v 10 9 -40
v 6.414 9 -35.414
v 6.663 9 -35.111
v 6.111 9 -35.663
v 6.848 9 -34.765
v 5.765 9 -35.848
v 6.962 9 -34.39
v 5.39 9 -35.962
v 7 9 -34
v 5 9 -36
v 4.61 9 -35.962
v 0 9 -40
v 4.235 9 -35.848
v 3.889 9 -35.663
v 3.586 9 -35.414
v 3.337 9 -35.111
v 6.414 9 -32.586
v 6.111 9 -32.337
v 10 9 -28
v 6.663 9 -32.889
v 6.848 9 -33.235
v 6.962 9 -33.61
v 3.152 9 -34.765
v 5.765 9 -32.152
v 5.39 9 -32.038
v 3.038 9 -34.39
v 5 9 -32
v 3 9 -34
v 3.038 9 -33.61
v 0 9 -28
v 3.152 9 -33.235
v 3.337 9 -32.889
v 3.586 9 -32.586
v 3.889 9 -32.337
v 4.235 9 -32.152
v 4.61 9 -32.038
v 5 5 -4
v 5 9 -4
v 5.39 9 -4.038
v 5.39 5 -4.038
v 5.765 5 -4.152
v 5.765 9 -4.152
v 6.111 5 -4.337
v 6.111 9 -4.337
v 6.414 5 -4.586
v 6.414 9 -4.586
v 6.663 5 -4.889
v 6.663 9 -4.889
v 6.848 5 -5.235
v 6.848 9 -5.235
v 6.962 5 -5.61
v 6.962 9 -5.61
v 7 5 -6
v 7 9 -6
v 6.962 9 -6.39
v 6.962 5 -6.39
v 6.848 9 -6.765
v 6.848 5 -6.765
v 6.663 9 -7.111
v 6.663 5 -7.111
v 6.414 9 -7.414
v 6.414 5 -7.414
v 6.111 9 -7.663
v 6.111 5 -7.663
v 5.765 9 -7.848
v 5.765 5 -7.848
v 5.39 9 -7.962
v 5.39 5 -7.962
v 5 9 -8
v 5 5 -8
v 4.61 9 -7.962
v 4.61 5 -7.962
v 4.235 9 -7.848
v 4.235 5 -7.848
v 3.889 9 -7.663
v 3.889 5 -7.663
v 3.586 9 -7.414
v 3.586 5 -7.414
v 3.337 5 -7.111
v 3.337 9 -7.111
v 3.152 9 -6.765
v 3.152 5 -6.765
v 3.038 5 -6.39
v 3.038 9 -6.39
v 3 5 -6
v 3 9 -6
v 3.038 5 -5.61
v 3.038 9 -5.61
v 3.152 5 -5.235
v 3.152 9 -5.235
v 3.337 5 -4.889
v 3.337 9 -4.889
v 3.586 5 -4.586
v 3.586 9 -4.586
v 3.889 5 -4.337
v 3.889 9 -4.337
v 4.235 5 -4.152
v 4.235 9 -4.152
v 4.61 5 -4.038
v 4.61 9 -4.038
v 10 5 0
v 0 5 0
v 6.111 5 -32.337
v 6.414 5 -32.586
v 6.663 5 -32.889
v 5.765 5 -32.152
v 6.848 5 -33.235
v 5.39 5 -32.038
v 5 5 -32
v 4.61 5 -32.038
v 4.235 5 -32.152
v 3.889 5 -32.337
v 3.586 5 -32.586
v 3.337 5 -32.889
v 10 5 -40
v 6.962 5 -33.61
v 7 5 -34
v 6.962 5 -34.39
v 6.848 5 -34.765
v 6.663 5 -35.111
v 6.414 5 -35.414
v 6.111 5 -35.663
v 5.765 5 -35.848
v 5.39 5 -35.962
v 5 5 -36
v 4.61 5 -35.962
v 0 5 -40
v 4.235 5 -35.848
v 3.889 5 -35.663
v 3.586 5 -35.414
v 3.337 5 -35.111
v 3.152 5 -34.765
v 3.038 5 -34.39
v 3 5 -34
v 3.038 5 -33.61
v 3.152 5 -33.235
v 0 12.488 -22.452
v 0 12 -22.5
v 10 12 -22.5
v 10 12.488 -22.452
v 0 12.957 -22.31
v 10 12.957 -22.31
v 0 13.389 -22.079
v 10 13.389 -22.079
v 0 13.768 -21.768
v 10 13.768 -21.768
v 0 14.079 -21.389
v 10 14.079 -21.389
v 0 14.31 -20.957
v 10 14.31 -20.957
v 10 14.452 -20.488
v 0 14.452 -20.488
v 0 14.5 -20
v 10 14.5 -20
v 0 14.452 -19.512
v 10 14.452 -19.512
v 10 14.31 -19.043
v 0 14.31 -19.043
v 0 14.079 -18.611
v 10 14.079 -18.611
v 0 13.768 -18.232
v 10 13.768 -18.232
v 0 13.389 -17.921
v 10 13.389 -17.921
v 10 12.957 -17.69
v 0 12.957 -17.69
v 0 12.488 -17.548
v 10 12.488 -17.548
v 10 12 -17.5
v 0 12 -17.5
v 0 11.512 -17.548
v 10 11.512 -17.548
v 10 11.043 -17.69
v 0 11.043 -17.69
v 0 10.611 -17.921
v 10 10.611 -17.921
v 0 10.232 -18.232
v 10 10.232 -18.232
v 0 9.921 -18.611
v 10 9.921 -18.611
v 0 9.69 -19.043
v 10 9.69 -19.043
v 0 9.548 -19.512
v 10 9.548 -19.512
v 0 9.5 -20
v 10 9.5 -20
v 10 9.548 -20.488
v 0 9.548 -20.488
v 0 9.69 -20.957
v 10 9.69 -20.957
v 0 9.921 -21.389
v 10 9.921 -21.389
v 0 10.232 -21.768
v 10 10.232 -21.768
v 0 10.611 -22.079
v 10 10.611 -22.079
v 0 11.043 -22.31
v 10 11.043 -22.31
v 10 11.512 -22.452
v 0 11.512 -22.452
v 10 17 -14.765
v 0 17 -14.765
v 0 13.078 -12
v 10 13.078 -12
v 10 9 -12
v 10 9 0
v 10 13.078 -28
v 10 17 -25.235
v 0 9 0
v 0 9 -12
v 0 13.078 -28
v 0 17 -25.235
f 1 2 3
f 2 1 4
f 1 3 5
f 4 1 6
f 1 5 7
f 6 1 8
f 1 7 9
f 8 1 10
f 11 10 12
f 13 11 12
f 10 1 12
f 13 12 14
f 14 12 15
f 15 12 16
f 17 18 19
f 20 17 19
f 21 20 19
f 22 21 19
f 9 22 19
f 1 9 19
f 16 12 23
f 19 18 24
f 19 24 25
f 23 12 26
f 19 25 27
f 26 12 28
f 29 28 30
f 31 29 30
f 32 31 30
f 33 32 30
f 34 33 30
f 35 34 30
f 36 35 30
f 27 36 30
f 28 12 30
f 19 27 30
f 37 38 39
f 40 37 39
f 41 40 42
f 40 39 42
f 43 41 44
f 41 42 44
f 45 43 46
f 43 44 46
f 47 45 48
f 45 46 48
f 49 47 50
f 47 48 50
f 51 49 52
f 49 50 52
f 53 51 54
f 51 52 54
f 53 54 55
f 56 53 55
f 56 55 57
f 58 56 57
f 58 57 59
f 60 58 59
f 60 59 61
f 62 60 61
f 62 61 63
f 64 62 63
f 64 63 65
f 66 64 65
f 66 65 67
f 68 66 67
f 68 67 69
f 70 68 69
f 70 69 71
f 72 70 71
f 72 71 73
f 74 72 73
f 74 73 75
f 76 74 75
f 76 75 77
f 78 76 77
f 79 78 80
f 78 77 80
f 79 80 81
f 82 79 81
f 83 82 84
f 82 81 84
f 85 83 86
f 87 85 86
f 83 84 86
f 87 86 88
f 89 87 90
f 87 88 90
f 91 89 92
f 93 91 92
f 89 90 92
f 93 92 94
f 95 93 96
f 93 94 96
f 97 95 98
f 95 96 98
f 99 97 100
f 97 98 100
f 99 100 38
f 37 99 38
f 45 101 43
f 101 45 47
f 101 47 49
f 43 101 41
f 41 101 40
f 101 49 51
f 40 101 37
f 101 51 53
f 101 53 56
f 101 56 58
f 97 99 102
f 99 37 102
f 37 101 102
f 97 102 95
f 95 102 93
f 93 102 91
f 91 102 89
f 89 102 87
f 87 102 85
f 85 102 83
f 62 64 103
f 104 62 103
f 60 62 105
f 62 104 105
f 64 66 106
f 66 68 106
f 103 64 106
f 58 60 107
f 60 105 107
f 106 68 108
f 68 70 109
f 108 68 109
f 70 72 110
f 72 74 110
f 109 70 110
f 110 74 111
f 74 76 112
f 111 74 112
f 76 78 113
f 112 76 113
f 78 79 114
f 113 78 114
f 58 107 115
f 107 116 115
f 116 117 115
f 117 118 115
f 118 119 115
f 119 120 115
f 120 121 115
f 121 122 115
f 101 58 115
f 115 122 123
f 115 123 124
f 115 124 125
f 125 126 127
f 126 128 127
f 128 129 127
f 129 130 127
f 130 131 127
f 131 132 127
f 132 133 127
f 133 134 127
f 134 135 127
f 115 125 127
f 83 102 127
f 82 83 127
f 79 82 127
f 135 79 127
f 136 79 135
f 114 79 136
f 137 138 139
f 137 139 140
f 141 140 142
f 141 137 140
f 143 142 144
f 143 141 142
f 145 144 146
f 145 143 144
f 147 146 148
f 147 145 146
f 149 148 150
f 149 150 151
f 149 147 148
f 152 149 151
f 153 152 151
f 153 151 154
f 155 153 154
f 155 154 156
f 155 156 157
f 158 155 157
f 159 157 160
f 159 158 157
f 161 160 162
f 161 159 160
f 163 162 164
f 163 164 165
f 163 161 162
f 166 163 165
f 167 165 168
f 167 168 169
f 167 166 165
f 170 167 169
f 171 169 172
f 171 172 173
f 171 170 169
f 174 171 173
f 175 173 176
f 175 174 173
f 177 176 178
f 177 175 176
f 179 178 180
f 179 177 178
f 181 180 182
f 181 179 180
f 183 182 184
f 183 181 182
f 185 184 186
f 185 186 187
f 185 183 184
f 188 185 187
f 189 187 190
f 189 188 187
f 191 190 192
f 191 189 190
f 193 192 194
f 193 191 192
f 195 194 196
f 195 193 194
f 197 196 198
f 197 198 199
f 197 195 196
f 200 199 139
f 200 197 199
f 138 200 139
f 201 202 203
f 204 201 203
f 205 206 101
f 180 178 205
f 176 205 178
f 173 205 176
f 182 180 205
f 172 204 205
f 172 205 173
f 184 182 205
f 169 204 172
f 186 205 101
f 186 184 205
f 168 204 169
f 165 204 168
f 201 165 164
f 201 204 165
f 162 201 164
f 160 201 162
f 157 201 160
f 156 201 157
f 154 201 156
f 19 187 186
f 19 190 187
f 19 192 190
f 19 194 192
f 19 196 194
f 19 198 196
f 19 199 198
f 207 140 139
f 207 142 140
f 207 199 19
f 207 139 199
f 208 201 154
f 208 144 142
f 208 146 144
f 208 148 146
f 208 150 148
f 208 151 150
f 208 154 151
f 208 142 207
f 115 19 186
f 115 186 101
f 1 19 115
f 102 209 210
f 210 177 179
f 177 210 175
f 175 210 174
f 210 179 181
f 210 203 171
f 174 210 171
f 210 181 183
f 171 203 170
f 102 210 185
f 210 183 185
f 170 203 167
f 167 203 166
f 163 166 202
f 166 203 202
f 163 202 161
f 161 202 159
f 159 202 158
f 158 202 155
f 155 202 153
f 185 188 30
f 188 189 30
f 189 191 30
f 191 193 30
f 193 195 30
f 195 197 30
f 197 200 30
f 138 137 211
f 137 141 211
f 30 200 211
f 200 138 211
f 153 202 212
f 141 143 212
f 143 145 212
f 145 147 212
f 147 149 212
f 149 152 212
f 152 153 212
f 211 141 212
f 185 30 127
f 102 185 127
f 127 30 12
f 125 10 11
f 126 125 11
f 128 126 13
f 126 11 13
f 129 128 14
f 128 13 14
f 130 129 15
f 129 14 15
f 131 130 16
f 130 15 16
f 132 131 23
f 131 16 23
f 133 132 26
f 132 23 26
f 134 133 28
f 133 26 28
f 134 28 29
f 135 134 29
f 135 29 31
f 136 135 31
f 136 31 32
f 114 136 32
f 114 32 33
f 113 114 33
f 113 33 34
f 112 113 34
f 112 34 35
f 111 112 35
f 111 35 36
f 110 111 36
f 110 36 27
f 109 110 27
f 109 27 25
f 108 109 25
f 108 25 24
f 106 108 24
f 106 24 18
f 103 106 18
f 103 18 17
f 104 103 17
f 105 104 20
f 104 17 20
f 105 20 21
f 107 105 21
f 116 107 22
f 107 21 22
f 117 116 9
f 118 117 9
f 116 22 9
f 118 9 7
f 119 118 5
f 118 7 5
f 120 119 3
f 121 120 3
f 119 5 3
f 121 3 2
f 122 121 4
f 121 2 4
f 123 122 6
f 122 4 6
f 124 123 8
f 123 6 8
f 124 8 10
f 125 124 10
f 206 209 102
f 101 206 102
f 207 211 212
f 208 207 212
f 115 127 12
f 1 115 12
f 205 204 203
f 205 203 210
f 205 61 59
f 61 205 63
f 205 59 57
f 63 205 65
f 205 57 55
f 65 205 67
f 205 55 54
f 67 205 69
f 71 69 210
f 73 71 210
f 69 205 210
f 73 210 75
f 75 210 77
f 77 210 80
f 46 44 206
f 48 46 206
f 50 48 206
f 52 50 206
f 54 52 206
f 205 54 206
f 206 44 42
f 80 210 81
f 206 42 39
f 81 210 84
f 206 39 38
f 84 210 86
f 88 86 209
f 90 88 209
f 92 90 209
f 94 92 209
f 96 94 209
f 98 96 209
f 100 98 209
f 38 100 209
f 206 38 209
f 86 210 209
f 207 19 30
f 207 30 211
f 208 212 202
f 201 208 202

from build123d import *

# Parameters (mm, degrees)
SKETCH_2_R          = 2.5
EXTRUDE_1_DEPTH     = 10
SKETCH_3_R          = 2
CUT_EXTRUDE_2_DEPTH = 43


with BuildPart() as part:
    # Эскиз2 → Вытянуть1 (new body)
    with BuildSketch(Plane(origin=(0, 0, 0), x_dir=(0, 0, -1), z_dir=(1, 0, 0))):
        Polygon((0, 5), (40, 5), (40, 9), (28, 9), (28, 13.077507284), (25.234860189, 17), (14.765139811, 17), (12, 13.077507284), (12, 9), (0, 9), align=None)
        with Locations((20, 12)):
            Circle(SKETCH_2_R, mode=Mode.SUBTRACT)
    extrude(amount=EXTRUDE_1_DEPTH)

    # Эскиз3 → Вытянуть2 (cut, through all)
    with BuildSketch(Plane(origin=(0, 9, 0), x_dir=(1, 0, 0), z_dir=(0, 1, 0))):
        with Locations(Location((5, 6, 0), (0, 0, 270))):
            Circle(SKETCH_3_R)
        with Locations(Location((5, 34, 0), (0, 0, 90))):
            Circle(SKETCH_3_R)
    extrude(amount=-CUT_EXTRUDE_2_DEPTH, mode=Mode.SUBTRACT)


solid = part.part
